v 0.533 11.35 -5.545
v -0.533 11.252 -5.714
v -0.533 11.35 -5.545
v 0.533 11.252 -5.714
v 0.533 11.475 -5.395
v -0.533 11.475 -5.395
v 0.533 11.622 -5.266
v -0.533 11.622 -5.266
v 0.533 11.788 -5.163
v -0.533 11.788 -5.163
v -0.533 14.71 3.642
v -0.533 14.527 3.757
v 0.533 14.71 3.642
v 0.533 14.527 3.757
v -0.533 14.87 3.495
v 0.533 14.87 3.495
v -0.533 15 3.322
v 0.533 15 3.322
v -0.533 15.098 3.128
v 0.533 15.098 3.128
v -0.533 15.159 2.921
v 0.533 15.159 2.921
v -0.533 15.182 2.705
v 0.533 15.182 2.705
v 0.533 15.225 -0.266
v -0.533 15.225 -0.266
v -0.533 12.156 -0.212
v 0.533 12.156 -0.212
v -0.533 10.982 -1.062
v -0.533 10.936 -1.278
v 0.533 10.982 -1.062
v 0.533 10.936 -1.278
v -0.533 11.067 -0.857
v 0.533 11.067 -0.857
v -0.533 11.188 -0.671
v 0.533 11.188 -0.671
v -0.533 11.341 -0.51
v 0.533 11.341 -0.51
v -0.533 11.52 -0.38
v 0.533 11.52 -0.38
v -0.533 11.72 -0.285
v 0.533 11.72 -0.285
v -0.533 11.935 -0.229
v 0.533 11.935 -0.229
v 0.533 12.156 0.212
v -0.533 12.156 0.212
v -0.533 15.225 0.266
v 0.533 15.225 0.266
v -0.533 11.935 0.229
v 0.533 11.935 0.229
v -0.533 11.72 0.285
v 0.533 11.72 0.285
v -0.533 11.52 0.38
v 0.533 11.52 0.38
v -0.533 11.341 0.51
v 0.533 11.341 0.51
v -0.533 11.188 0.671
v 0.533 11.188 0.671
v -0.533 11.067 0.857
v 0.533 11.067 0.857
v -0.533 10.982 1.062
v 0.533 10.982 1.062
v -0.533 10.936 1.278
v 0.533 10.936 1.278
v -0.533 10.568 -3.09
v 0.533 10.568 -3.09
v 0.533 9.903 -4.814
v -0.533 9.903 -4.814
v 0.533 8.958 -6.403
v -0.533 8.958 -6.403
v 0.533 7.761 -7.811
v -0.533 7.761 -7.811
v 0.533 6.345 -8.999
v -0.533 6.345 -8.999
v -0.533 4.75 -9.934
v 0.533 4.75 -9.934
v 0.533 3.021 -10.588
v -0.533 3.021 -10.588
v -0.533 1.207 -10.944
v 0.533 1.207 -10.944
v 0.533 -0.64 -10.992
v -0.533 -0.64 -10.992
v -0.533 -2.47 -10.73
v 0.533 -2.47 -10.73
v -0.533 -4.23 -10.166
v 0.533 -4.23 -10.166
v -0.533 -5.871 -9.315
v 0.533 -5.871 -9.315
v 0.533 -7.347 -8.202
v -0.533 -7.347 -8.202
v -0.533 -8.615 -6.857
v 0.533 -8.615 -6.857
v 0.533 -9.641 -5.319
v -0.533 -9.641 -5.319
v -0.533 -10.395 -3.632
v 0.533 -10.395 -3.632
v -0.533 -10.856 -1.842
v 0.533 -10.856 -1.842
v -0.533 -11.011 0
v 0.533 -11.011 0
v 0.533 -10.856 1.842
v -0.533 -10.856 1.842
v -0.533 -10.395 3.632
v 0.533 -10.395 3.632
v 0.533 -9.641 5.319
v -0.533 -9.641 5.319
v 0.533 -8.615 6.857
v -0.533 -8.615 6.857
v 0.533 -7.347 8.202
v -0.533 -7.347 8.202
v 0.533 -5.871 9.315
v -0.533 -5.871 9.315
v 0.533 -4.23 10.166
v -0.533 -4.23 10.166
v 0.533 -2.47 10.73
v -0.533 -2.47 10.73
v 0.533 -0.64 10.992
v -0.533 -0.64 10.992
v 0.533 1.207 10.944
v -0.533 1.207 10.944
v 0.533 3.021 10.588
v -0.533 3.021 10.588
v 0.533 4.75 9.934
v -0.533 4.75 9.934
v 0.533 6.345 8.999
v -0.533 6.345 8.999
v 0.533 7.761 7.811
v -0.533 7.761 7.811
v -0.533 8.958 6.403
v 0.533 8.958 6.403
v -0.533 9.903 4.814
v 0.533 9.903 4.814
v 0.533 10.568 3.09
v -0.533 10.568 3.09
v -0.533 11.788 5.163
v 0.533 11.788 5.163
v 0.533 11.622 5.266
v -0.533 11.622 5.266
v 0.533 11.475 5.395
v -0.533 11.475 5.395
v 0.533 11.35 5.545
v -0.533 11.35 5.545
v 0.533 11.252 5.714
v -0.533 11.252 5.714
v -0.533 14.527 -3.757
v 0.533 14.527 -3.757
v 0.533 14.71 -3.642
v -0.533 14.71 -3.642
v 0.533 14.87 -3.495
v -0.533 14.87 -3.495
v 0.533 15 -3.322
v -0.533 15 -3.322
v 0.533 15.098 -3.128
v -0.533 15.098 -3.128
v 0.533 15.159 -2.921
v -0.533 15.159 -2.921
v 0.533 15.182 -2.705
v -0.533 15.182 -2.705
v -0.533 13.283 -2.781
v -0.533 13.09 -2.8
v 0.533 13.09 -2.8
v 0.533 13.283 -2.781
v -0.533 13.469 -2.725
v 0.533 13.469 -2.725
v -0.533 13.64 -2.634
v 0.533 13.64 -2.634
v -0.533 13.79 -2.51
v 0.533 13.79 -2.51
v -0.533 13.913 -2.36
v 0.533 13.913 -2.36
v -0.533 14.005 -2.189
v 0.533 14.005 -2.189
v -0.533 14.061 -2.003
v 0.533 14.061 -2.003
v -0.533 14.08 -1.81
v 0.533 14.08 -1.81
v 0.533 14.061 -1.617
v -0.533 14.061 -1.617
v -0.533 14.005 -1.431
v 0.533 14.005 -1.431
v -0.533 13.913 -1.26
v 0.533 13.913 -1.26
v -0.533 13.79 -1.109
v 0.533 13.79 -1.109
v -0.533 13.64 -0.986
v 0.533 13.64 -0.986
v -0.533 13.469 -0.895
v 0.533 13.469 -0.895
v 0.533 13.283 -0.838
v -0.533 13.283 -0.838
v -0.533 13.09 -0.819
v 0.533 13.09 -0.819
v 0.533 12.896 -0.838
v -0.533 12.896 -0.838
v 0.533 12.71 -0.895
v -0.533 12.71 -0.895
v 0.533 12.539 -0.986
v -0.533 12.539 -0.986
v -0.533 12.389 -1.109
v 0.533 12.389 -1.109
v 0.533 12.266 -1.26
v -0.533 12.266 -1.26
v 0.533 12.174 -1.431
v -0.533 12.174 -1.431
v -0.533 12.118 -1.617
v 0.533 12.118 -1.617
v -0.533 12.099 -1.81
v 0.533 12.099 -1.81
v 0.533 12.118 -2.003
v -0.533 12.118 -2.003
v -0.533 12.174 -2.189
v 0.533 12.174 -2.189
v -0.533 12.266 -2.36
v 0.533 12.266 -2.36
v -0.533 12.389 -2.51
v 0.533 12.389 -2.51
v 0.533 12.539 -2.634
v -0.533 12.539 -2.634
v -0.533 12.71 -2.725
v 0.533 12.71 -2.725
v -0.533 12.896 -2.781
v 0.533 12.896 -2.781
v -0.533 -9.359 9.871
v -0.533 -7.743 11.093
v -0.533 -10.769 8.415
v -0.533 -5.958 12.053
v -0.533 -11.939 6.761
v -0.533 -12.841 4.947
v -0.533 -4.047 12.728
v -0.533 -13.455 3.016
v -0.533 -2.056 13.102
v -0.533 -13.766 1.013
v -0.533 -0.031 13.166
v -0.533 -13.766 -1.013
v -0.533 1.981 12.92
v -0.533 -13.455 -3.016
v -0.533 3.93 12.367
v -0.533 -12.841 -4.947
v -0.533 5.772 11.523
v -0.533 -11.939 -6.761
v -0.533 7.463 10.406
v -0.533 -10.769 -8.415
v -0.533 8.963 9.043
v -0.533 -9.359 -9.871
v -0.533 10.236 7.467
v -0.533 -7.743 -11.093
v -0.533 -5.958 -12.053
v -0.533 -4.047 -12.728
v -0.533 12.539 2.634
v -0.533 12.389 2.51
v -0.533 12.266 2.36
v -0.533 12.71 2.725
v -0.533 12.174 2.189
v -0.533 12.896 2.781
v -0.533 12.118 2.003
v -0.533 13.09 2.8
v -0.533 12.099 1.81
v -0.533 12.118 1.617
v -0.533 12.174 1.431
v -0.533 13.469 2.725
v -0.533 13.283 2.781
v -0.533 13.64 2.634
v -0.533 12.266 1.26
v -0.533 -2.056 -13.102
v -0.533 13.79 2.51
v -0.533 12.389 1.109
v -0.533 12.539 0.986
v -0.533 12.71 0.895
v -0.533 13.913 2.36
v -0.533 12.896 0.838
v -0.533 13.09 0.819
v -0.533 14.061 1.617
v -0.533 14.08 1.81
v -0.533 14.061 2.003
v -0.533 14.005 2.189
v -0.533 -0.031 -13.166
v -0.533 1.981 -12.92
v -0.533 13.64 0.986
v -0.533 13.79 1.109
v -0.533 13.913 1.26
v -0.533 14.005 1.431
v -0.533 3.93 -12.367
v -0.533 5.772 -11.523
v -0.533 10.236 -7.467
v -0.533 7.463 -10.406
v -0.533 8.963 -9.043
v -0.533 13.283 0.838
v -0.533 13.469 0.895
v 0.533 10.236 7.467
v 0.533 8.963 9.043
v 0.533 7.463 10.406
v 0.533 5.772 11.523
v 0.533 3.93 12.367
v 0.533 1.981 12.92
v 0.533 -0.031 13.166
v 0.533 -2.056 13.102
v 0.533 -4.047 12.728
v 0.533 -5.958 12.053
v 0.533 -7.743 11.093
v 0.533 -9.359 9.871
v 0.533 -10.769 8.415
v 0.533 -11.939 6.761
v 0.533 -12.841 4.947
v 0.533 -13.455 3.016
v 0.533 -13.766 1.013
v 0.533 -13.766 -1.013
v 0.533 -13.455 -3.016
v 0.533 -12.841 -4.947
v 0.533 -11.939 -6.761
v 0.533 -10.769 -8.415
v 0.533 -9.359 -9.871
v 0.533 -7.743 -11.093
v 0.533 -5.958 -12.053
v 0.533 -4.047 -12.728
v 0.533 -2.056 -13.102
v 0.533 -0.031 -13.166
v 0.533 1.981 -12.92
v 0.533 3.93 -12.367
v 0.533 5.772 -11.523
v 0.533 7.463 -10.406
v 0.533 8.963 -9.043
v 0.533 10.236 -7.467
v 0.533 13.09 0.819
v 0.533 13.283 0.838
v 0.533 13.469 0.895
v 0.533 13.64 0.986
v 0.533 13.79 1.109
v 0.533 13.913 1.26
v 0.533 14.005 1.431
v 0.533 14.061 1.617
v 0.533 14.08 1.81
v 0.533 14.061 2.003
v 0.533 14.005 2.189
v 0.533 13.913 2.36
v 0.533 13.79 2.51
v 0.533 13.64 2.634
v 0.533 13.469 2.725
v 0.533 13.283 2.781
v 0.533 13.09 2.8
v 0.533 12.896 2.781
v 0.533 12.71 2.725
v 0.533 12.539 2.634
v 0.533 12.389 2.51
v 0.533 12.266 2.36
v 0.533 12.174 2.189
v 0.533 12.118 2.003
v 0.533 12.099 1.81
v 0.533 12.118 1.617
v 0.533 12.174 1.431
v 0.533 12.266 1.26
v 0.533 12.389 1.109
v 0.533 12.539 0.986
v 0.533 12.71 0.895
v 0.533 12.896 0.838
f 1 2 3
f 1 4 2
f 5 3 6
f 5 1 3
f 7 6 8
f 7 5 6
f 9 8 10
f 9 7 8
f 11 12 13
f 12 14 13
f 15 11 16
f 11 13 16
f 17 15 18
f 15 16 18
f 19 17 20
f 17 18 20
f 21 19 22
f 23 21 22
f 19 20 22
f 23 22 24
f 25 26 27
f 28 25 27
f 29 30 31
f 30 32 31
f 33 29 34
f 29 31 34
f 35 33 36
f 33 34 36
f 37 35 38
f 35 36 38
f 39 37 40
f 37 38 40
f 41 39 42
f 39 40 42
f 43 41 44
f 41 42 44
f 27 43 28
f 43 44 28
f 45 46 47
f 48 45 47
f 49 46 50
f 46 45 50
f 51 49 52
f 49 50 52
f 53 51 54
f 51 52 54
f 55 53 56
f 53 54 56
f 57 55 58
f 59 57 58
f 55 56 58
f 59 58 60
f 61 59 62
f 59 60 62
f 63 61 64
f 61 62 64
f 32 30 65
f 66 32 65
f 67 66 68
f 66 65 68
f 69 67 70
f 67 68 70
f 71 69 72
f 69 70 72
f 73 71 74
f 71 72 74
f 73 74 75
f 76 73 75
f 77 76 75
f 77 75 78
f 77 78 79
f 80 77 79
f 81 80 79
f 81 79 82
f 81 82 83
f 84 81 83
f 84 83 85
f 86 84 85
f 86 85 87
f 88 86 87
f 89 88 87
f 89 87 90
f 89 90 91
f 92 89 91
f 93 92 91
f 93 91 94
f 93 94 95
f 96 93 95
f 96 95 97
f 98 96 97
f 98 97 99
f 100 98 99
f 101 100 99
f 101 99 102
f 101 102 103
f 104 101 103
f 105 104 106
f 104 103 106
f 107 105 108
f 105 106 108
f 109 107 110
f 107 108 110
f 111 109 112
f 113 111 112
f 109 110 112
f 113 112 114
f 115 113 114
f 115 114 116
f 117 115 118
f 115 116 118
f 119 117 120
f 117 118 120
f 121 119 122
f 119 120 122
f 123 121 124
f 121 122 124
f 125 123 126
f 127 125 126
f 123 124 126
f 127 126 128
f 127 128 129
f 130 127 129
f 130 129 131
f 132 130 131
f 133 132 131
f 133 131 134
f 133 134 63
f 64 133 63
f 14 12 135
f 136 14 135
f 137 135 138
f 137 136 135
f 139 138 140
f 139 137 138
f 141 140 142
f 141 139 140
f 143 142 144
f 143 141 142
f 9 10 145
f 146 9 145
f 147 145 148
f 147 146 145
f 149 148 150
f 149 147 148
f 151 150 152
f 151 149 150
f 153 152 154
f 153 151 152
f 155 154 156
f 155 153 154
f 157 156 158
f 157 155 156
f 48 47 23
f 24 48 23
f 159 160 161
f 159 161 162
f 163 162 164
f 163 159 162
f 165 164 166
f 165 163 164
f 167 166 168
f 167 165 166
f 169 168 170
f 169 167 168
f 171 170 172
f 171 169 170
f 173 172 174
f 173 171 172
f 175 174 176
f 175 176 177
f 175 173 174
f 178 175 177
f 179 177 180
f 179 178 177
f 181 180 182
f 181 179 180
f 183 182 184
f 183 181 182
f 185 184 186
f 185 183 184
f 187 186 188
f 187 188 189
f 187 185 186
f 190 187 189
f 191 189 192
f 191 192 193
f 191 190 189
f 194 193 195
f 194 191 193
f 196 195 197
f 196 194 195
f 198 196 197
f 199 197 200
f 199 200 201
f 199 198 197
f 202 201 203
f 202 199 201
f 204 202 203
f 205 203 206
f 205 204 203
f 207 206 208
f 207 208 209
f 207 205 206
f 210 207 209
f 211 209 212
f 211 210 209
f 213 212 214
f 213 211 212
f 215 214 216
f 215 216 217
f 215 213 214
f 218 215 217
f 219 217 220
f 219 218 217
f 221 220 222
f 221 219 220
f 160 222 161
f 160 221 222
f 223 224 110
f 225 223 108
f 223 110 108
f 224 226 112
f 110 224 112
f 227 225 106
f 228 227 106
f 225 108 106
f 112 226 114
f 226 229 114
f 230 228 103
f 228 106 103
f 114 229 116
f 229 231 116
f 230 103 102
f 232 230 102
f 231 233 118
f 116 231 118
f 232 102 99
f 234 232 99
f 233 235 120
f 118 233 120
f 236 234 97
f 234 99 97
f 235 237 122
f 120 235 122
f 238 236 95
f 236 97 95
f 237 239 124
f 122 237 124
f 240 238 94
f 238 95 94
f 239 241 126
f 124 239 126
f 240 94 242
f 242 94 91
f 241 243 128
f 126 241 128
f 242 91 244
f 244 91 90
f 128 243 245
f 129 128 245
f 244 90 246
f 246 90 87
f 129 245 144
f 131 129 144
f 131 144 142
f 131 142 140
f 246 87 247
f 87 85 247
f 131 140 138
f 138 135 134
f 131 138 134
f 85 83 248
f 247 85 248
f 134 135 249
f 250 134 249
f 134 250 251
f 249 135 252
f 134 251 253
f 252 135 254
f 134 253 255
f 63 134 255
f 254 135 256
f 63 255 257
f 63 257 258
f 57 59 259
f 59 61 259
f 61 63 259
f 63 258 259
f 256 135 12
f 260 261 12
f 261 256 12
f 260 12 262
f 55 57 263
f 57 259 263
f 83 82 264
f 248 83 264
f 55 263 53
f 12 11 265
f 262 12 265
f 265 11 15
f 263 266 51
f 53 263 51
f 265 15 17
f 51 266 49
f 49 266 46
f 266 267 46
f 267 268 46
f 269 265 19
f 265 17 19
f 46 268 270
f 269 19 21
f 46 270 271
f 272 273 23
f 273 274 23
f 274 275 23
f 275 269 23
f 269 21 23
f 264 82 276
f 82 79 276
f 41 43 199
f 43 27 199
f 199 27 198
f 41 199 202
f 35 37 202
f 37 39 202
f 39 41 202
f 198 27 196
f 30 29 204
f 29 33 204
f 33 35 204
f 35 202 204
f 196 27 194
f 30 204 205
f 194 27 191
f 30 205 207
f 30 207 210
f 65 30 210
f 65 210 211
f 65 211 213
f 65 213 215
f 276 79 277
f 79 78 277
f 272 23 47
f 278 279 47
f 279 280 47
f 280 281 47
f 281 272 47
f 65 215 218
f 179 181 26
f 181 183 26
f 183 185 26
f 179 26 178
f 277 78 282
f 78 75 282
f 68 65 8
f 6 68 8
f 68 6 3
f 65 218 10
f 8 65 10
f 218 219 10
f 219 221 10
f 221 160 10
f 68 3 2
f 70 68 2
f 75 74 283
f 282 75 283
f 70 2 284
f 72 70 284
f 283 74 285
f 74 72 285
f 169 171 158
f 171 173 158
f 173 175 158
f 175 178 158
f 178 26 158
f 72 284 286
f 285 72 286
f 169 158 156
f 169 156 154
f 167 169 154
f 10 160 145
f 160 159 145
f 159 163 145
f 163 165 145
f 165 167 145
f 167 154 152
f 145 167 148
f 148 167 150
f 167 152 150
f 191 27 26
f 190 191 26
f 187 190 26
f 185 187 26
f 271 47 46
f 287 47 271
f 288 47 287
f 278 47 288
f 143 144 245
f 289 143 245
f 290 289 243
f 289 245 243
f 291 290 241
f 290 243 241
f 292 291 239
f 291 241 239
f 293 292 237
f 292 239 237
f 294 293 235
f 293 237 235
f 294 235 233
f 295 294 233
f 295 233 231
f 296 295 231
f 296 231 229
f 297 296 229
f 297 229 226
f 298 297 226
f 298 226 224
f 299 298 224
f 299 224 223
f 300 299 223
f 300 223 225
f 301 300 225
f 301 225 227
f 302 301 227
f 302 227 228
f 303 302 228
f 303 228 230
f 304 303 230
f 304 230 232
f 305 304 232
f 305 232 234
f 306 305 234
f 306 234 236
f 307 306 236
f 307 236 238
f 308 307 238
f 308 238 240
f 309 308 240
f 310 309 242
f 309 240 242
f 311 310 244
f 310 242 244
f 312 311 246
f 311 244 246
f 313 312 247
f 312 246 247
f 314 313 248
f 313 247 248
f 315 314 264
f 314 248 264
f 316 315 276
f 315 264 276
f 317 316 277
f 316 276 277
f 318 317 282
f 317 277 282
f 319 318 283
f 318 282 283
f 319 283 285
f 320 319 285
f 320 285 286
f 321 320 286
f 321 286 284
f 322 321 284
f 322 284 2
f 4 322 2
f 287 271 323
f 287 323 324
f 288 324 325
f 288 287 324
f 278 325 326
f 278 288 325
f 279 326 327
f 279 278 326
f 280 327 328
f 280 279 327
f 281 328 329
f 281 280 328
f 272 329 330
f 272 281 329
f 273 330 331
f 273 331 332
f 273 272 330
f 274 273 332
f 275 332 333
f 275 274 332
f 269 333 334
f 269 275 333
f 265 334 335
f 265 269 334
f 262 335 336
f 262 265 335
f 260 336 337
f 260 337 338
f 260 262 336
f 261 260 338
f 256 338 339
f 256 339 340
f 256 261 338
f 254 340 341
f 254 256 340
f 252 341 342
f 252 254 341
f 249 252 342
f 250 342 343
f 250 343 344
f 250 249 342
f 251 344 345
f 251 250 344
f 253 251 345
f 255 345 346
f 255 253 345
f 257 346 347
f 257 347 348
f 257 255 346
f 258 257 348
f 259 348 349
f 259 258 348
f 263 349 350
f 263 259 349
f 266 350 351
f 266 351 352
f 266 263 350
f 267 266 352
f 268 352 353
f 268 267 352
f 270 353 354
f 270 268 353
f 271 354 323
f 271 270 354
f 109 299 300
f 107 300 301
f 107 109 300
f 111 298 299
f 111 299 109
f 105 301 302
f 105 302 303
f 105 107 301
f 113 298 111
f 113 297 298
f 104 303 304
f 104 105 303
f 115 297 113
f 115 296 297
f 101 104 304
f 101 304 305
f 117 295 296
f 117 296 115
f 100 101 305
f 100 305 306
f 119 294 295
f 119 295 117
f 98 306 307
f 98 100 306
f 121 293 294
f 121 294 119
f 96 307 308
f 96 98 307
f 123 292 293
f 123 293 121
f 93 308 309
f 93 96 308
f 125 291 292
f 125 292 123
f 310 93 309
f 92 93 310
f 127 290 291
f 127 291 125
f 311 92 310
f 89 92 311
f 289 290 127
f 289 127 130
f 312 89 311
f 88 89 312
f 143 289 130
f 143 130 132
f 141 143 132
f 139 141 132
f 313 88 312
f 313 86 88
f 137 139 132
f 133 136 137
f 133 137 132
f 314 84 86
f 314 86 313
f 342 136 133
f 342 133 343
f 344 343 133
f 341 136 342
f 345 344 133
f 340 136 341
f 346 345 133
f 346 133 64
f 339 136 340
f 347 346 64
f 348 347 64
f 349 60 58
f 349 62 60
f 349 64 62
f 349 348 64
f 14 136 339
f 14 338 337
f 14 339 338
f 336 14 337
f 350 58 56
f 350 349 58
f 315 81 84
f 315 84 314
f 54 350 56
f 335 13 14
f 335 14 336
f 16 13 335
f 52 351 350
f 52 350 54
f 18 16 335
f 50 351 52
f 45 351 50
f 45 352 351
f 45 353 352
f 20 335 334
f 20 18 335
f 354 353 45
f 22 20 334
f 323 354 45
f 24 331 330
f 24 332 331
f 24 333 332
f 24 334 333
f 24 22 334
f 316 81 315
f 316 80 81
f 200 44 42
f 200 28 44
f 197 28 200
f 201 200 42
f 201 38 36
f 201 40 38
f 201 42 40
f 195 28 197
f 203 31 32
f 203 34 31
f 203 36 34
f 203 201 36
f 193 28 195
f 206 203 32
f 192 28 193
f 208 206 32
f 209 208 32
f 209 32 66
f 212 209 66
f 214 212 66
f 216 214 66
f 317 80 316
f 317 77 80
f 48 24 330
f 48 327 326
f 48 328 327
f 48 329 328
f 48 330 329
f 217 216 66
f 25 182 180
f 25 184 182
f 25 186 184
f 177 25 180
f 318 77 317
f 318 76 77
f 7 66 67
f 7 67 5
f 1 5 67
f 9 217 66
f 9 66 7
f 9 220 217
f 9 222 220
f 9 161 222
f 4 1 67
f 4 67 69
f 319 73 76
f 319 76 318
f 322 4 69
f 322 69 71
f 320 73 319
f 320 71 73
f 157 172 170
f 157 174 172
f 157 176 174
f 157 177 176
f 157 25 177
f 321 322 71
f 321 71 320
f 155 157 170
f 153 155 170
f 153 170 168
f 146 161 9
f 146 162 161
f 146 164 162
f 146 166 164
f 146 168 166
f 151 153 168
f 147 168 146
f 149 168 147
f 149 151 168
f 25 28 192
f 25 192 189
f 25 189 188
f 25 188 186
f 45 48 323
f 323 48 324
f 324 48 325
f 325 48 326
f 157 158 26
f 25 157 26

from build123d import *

# Parameters (mm, degrees)
BOSS_EXTRUDE1_DEPTH      = 0.5334
BOSS_EXTRUDE1_DEPTH_BACK = 0.5334
SKETCH3_R                = 0.9906
FILLET1_R                = 1.2065


with BuildPart() as part:
    # Sketch3 → Boss-Extrude1 (new, two sides: drawn at the far end of the back side and taken through both)
    with BuildSketch(Plane(origin=(0, 0, 0), x_dir=(0, 0, -1), z_dir=(1, 0, 0)).offset(-BOSS_EXTRUDE1_DEPTH_BACK)):
        with BuildLine():
            Line((-3.427571395, 15.169791064), (-5.352943643, 11.418661811))
            ThreePointArc((-5.352943643, 11.418661811), (0, -13.8049), (5.352943643, 11.418661811))
            Line((5.352943643, 11.418661811), (3.427571395, 15.169791064))
            Line((3.427571395, 15.169791064), (0.265753029, 15.224980808))
            Line((0.265753029, 15.224980808), (0.192166702, 11.009222987))
            ThreePointArc((0.192166702, 11.009222987), (0, -11.0109), (-0.192166702, 11.009222987))
            Line((-0.192166702, 11.009222987), (-0.265753029, 15.224980808))
            Line((-0.265753029, 15.224980808), (-3.427571395, 15.169791064))
        make_face()
        with Locations((-1.809869048, 13.089507025)):
            Circle(SKETCH3_R, mode=Mode.SUBTRACT)
        with Locations((1.809869048, 13.089507025)):
            Circle(SKETCH3_R, mode=Mode.SUBTRACT)
    extrude(amount=BOSS_EXTRUDE1_DEPTH + BOSS_EXTRUDE1_DEPTH_BACK)

    # Fillet1
    fillet1_edges = [part.edges().sort_by_distance(p)[0] for p in [
        (0, 11.418661811, 5.352943643),
        (0, 15.169791064, 3.427571395),
        (0, 11.009222987, 0.192166702),
        (0, 11.009222987, -0.192166702),
        (0, 15.169791064, -3.427571395),
        (0, 11.418661811, -5.352943643),
    ]]
    fillet(fillet1_edges, radius=FILLET1_R)


solid = part.part
